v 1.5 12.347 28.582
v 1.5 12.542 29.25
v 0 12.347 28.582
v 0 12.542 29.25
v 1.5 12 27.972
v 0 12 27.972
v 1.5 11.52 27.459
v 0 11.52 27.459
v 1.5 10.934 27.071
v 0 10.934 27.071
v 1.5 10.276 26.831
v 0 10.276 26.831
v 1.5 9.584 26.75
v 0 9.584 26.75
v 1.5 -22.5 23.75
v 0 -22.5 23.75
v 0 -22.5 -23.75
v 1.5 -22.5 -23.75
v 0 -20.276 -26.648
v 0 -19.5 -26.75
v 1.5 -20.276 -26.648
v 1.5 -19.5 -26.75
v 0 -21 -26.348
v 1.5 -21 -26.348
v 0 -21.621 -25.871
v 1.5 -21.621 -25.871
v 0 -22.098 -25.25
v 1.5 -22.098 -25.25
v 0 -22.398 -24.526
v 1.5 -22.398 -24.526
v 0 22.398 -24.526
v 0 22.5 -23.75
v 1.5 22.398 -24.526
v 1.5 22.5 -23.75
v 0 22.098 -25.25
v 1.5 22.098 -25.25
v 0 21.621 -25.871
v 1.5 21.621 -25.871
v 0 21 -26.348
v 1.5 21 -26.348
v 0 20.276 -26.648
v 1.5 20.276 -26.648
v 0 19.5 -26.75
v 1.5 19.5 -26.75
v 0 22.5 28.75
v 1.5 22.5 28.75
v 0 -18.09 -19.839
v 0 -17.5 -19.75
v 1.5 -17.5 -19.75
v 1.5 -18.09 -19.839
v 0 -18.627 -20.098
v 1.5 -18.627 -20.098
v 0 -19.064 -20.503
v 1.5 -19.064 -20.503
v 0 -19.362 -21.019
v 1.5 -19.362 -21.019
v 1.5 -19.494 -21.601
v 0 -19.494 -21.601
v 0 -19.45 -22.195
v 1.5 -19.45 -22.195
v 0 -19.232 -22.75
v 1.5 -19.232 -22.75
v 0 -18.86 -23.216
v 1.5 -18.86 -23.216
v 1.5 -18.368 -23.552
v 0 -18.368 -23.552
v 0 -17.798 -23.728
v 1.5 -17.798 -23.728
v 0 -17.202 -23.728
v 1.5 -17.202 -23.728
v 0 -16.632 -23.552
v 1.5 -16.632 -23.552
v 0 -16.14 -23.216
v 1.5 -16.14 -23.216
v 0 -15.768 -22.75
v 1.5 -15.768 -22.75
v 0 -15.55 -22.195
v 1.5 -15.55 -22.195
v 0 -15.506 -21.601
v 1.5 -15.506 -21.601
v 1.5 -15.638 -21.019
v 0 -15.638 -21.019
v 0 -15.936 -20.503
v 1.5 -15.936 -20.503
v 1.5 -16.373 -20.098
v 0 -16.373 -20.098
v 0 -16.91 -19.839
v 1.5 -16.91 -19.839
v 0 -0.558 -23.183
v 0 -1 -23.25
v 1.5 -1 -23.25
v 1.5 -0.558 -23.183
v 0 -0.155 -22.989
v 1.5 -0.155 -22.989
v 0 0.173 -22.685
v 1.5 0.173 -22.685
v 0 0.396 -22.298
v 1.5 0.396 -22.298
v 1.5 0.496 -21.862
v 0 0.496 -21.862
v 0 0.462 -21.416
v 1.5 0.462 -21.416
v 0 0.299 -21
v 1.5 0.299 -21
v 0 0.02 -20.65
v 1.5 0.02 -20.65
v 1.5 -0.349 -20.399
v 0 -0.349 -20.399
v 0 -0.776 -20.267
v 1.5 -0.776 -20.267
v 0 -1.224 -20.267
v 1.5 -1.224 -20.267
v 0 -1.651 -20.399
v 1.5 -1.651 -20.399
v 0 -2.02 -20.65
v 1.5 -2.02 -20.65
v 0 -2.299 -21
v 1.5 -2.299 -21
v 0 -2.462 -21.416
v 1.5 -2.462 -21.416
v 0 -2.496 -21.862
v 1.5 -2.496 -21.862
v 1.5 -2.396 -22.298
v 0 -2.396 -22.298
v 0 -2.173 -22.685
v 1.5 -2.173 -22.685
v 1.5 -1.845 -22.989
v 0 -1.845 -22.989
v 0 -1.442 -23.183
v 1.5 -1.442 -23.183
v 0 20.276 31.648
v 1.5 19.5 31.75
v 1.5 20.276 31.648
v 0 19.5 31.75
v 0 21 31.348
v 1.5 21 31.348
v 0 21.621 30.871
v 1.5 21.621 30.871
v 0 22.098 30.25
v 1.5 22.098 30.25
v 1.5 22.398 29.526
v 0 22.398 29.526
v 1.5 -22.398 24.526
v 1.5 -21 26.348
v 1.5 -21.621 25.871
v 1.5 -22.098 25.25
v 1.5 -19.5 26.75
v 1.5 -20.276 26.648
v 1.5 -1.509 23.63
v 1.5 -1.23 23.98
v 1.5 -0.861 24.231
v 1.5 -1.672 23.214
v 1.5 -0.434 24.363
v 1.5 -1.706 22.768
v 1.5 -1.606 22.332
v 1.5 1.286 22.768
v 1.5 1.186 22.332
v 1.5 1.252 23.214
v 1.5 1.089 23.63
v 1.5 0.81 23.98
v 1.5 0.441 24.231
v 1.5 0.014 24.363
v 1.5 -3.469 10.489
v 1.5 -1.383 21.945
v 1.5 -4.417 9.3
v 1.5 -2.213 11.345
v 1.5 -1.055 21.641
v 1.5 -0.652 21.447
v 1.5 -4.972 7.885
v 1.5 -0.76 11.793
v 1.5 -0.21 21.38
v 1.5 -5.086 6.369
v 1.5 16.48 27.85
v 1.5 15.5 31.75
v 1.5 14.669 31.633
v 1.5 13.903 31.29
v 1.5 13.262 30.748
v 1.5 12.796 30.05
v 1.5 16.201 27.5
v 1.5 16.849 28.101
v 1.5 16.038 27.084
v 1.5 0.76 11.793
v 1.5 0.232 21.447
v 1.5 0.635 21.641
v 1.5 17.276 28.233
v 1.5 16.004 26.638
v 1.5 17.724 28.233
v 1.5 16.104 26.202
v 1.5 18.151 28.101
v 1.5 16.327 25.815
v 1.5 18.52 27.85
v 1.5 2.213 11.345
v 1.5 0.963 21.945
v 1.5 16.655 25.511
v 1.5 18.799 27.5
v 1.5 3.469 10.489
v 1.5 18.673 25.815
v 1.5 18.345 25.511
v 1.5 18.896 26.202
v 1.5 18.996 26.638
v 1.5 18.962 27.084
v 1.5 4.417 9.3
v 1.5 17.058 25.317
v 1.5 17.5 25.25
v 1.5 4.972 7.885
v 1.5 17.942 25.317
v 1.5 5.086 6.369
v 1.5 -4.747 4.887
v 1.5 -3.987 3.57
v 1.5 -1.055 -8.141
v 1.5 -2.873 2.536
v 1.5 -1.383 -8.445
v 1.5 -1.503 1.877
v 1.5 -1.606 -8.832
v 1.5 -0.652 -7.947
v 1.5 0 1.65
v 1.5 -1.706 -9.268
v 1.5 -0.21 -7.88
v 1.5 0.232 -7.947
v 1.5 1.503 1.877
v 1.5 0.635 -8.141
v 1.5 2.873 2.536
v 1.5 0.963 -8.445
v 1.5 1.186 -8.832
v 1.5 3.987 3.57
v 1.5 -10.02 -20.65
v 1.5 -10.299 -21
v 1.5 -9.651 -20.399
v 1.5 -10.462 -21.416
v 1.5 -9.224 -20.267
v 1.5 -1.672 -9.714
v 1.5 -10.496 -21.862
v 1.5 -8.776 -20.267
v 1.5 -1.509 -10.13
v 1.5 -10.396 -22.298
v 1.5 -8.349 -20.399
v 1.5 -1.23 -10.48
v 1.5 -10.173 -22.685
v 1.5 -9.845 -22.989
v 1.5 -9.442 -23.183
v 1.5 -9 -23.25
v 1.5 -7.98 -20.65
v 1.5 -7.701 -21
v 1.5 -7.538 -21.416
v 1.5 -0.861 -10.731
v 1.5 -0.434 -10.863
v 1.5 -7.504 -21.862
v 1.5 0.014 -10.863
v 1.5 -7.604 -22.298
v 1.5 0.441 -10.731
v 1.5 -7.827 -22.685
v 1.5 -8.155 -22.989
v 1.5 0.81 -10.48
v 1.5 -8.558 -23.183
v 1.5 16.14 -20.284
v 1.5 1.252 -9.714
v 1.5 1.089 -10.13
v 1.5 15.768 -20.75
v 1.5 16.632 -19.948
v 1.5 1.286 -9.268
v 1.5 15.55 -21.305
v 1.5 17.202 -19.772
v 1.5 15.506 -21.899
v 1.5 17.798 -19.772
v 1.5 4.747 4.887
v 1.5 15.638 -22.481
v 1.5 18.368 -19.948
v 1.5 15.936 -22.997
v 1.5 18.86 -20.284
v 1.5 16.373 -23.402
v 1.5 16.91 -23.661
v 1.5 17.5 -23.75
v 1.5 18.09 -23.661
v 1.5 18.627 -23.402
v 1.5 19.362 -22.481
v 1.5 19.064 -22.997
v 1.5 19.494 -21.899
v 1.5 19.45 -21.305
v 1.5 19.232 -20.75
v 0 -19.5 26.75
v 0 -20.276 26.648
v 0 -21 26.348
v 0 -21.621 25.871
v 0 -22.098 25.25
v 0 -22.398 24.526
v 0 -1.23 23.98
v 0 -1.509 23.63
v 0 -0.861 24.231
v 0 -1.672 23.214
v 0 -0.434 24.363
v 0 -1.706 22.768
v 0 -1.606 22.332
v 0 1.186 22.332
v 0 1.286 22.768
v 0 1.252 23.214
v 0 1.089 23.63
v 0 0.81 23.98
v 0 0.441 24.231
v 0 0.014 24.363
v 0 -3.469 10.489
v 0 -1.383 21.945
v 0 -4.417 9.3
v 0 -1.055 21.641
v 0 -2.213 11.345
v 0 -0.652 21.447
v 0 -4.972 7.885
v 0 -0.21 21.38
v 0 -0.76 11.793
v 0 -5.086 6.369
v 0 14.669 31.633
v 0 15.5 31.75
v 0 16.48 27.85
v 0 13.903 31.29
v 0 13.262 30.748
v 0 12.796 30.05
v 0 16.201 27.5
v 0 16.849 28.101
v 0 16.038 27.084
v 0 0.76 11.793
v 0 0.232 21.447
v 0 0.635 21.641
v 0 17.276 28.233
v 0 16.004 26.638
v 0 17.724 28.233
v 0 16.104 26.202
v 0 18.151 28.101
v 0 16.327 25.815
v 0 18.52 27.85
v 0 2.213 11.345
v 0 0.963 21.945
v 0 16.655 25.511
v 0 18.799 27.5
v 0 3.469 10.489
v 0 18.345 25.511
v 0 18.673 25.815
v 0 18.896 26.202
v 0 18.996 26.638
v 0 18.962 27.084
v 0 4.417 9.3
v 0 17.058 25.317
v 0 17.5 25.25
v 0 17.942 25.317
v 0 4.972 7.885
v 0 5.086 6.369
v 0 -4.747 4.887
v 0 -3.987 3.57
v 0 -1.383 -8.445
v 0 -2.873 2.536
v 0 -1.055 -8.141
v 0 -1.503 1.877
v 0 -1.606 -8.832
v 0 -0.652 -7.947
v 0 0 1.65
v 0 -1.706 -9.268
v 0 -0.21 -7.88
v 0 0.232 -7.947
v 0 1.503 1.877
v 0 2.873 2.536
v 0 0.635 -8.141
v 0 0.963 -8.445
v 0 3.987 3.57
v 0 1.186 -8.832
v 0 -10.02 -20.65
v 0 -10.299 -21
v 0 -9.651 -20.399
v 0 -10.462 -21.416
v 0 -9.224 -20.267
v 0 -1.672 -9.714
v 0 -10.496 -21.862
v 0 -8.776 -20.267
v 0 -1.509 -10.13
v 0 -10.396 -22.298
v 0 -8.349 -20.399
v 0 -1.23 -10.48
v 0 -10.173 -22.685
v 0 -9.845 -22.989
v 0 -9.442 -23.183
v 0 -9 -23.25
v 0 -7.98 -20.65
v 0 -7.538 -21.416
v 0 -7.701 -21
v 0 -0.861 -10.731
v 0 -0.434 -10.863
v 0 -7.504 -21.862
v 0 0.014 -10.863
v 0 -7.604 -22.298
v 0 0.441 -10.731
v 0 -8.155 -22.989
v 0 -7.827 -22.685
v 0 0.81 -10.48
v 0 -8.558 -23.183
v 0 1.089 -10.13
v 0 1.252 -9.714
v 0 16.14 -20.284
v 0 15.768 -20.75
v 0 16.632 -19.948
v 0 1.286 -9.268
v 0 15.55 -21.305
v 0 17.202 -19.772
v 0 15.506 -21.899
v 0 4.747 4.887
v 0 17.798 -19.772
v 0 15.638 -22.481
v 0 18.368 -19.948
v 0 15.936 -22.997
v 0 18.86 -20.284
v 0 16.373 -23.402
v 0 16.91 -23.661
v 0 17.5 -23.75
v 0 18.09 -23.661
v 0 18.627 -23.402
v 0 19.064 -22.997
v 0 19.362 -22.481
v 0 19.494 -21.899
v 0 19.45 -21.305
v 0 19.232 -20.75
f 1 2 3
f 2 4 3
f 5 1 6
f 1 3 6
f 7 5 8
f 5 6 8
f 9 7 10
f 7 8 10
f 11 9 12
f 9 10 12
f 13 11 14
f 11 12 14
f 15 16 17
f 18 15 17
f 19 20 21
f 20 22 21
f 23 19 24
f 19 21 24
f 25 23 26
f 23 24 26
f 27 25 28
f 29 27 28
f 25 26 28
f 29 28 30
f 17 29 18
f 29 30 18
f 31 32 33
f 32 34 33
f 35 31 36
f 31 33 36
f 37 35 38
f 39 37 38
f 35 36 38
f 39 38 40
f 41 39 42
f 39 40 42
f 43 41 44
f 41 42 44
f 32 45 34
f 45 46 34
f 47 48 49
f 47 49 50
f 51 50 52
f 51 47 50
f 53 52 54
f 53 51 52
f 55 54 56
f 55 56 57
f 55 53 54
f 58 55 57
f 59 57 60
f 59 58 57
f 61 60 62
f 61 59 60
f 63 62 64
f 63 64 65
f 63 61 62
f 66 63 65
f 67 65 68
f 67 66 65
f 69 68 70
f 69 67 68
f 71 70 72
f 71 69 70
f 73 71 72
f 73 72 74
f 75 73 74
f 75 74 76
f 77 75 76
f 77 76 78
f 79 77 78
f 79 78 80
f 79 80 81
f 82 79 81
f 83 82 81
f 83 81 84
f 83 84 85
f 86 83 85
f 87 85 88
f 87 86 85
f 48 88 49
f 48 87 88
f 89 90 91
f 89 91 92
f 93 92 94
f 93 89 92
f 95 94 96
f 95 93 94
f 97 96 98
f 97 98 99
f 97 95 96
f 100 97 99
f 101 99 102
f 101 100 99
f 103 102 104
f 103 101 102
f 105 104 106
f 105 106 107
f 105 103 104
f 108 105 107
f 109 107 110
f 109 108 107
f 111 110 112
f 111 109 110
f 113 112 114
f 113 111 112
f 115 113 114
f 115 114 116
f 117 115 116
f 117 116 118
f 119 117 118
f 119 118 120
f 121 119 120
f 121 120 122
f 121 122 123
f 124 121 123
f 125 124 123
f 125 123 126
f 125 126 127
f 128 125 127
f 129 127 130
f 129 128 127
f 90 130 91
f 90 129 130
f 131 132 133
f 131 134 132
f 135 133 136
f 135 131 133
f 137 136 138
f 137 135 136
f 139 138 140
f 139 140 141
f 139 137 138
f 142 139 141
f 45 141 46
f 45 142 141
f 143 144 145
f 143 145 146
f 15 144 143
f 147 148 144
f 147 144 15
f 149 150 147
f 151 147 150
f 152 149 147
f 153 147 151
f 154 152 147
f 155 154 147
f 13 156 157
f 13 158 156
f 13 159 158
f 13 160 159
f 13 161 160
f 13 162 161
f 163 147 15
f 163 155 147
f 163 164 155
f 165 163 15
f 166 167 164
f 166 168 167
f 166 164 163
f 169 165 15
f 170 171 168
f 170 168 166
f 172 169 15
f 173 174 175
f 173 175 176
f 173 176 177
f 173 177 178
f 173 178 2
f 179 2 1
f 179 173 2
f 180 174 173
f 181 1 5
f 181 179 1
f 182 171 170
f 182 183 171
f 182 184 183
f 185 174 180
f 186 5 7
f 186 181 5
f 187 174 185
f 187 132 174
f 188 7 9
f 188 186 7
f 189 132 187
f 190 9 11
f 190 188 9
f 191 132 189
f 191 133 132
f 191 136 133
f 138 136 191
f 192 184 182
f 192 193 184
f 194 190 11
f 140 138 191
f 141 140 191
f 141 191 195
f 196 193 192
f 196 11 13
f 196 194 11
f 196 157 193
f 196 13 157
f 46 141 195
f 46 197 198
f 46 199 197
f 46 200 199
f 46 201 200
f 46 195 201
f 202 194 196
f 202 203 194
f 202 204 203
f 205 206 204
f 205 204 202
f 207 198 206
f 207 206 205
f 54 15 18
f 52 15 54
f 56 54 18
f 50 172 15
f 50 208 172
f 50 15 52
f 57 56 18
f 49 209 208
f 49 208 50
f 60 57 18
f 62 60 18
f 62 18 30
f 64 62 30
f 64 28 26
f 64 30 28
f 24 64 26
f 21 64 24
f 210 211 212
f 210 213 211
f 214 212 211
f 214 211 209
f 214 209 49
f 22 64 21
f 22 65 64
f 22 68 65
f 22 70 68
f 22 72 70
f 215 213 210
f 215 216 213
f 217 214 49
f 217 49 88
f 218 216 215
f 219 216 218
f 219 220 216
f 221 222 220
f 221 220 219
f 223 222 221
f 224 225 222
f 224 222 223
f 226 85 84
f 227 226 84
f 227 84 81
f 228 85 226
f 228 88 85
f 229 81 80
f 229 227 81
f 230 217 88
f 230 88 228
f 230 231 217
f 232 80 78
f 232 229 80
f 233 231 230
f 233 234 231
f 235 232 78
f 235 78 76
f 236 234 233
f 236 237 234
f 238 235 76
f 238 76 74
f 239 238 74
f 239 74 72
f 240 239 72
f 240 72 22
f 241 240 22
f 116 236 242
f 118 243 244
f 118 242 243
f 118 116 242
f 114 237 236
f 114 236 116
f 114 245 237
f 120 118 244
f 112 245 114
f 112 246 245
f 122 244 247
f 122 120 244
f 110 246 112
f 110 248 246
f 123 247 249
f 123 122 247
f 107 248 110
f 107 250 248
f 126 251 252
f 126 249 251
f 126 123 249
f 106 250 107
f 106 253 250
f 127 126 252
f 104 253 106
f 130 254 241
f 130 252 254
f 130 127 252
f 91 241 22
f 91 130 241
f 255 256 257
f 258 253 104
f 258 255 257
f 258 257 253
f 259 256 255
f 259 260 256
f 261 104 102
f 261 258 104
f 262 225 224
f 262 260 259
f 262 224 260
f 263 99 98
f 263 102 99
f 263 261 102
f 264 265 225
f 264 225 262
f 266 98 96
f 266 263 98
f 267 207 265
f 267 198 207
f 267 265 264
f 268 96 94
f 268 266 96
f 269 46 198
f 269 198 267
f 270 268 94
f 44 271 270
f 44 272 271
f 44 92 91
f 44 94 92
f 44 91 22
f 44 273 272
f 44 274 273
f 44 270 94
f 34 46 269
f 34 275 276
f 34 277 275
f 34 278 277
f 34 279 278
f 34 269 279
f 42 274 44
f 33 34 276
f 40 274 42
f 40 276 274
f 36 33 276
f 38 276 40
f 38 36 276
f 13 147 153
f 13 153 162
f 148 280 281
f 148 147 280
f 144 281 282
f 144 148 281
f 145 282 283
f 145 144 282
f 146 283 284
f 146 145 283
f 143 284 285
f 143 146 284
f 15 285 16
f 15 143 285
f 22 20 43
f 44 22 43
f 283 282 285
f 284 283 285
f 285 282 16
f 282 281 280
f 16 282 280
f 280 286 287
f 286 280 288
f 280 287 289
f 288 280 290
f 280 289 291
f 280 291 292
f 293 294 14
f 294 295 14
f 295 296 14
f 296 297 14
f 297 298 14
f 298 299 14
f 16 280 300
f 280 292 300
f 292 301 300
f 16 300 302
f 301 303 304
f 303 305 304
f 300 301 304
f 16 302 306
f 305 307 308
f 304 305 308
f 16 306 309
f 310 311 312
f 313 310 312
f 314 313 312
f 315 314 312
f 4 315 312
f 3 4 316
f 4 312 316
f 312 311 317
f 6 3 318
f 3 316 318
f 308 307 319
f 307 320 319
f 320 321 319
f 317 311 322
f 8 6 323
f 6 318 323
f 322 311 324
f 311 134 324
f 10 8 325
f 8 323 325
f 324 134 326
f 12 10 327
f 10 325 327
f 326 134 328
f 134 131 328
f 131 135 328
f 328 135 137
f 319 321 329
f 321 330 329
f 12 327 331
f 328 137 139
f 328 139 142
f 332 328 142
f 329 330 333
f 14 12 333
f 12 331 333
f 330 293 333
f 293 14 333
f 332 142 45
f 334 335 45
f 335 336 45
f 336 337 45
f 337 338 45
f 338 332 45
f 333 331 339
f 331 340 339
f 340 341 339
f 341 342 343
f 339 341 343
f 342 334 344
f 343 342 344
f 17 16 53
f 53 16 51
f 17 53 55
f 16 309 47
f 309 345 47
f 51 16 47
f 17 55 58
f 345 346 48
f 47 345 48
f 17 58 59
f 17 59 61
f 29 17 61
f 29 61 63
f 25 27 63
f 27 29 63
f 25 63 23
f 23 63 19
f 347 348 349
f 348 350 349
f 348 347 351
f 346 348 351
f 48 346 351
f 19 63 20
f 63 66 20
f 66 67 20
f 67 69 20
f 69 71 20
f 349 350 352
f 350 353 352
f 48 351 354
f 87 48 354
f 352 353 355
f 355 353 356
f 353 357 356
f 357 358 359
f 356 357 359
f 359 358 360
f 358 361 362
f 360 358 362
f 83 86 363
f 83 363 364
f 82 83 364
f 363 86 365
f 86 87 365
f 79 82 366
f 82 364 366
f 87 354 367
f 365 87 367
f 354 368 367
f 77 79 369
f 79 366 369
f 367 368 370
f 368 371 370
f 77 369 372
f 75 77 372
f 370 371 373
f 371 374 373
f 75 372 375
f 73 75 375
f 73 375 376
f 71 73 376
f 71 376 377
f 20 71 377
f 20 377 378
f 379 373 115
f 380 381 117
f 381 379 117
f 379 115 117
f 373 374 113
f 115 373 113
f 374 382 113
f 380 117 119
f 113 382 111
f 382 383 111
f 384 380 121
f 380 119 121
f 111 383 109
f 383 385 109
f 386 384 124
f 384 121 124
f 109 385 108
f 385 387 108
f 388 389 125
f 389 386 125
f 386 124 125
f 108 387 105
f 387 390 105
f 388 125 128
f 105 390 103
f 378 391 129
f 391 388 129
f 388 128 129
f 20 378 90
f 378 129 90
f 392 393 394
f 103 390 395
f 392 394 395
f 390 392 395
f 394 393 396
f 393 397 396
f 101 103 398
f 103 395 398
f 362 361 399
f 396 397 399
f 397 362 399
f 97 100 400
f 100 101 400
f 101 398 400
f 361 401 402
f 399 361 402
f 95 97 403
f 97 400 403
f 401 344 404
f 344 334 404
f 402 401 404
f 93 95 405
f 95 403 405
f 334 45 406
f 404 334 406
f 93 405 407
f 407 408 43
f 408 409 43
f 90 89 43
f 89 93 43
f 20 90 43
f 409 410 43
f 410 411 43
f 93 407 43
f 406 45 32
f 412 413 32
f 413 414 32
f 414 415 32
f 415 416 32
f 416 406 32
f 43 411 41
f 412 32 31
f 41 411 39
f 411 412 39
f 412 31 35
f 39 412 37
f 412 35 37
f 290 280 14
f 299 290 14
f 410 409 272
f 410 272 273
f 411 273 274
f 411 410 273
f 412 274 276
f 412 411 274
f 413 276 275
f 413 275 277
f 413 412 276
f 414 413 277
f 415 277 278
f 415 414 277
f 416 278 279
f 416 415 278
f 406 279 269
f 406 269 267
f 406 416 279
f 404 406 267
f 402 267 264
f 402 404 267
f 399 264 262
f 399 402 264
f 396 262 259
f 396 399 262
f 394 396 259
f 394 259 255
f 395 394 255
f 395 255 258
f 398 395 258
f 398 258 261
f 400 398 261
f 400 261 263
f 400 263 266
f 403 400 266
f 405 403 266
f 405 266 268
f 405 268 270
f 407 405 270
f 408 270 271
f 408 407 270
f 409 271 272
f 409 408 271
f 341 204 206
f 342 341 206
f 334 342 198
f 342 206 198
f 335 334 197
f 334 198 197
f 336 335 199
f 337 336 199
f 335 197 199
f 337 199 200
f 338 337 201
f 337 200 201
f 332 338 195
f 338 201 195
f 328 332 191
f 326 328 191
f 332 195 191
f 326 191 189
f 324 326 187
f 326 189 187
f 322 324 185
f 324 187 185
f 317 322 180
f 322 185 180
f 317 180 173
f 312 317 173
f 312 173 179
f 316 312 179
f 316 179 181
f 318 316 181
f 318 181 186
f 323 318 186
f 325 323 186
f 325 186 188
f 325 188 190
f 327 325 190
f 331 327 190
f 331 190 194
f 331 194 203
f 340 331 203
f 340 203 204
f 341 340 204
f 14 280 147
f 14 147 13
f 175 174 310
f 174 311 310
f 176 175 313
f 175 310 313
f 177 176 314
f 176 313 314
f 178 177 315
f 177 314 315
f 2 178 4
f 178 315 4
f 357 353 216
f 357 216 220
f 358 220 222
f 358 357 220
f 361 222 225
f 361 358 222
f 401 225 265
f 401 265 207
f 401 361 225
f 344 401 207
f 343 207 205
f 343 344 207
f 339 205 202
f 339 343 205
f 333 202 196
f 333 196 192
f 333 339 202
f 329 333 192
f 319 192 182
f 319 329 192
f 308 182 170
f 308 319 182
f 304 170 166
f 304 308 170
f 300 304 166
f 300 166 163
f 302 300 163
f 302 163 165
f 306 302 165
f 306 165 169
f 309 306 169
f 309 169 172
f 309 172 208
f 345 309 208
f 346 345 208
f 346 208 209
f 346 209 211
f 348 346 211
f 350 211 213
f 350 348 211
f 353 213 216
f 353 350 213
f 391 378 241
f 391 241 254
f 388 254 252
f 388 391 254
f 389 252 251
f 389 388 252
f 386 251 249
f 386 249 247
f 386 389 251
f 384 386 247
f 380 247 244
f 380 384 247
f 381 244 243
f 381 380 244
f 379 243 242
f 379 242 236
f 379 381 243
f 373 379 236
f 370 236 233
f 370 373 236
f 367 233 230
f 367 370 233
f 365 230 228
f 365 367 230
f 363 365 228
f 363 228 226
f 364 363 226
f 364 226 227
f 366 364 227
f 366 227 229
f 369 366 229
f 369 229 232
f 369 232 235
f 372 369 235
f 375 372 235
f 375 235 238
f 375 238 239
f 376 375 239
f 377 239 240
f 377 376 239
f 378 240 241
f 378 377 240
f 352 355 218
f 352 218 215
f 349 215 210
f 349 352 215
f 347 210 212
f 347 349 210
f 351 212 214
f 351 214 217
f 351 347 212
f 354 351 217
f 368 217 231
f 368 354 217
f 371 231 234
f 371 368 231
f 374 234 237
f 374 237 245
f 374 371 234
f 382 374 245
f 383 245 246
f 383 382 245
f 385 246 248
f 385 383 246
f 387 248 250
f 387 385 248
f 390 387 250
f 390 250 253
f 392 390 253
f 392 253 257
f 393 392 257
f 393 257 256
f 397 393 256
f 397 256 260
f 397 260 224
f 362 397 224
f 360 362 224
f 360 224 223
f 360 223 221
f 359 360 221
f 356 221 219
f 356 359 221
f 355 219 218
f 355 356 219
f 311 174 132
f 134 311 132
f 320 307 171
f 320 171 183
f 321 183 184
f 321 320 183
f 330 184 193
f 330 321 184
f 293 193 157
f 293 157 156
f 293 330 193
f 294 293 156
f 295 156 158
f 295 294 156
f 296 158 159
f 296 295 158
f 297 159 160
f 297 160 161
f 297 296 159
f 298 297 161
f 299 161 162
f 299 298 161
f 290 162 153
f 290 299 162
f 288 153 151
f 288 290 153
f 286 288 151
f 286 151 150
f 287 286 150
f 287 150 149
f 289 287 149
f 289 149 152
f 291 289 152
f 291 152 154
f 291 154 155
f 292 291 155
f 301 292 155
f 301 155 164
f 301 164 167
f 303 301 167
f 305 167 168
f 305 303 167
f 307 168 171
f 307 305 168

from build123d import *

# Parameters (mm, degrees)
SKETCH_1_W          = 53.5
SKETCH_1_H          = 45
SKETCH_1_R          = 5.1
SKETCH_1_R_2        = 2
SKETCH_1_R_3        = 1.5
EXTRUDE_1_DEPTH     = 1.5
SKETCH_3_W          = 5
SKETCH_3_H          = 10
EXTRUDE_2_DEPTH     = 1.5
SKETCH_4_R          = 1.5
CUT_EXTRUDE_2_DEPTH = 39.943067419
FILLET_1_R          = 3
FILLET_2_R          = 3


with BuildPart() as part:
    # ｽｹｯﾁ1 → ﾎﾞｽ - 押し出し1 (new body)
    with BuildSketch(Plane(origin=(0, 0, 0), x_dir=(0, 0, -1), z_dir=(1, 0, 0))):
        Rectangle(SKETCH_1_W, SKETCH_1_H)
        with Locations((-6.75, 0)):
            Circle(SKETCH_1_R, mode=Mode.SUBTRACT)
        with Locations((21.75, 17.5)):
            Circle(SKETCH_1_R_2, mode=Mode.SUBTRACT)
        with Locations((-22.88, -0.21)):
            Circle(SKETCH_1_R_3, mode=Mode.SUBTRACT)
        with Locations(Location((9.38, -0.21, 0), (0, 0, 180))):
            Circle(SKETCH_1_R_3, mode=Mode.SUBTRACT)
        with Locations((21.75, -1)):
            Circle(SKETCH_1_R_3, mode=Mode.SUBTRACT)
        with Locations(Location((21.75, -17.5, 0), (0, 0, 180))):
            Circle(SKETCH_1_R_2, mode=Mode.SUBTRACT)
        with Locations((21.75, -9)):
            Circle(SKETCH_1_R_3, mode=Mode.SUBTRACT)
    extrude(amount=EXTRUDE_1_DEPTH)

    # ｽｹｯﾁ3 → ﾎﾞｽ - 押し出し2 (add)
    with BuildSketch(Plane(origin=(1.5, 0, 0), x_dir=(0, 0, -1), z_dir=(1, 0, 0))):
        with Locations((-29.25, 17.5)):
            Rectangle(SKETCH_3_W, SKETCH_3_H)
    extrude(amount=-EXTRUDE_2_DEPTH)

    # ｽｹｯﾁ4 → ｶｯﾄ - 押し出し2 (cut, through all)
    with BuildSketch(Plane(origin=(1.5, 0, 0), x_dir=(0, 0, -1), z_dir=(1, 0, 0))):
        with Locations((-26.75, 17.5)):
            Circle(SKETCH_4_R)
    extrude(amount=-CUT_EXTRUDE_2_DEPTH, mode=Mode.SUBTRACT)

    # ﾌｨﾚｯﾄ1
    fillet_1_edges = [part.edges().sort_by_distance(p)[0] for p in [
        (0.75, 22.5, 31.75),
        (0.75, 12.5, 31.75),
        (0.75, -22.5, -26.75),
        (0.75, -22.5, 26.75),
        (0.75, 22.5, -26.75),
    ]]
    fillet(fillet_1_edges, radius=FILLET_1_R)

    # ﾌｨﾚｯﾄ2
    fillet_2_edges = [part.edges().sort_by_distance(p)[0] for p in [
        (0.75, 12.5, 26.75),
    ]]
    fillet(fillet_2_edges, radius=FILLET_2_R)


solid = part.part
